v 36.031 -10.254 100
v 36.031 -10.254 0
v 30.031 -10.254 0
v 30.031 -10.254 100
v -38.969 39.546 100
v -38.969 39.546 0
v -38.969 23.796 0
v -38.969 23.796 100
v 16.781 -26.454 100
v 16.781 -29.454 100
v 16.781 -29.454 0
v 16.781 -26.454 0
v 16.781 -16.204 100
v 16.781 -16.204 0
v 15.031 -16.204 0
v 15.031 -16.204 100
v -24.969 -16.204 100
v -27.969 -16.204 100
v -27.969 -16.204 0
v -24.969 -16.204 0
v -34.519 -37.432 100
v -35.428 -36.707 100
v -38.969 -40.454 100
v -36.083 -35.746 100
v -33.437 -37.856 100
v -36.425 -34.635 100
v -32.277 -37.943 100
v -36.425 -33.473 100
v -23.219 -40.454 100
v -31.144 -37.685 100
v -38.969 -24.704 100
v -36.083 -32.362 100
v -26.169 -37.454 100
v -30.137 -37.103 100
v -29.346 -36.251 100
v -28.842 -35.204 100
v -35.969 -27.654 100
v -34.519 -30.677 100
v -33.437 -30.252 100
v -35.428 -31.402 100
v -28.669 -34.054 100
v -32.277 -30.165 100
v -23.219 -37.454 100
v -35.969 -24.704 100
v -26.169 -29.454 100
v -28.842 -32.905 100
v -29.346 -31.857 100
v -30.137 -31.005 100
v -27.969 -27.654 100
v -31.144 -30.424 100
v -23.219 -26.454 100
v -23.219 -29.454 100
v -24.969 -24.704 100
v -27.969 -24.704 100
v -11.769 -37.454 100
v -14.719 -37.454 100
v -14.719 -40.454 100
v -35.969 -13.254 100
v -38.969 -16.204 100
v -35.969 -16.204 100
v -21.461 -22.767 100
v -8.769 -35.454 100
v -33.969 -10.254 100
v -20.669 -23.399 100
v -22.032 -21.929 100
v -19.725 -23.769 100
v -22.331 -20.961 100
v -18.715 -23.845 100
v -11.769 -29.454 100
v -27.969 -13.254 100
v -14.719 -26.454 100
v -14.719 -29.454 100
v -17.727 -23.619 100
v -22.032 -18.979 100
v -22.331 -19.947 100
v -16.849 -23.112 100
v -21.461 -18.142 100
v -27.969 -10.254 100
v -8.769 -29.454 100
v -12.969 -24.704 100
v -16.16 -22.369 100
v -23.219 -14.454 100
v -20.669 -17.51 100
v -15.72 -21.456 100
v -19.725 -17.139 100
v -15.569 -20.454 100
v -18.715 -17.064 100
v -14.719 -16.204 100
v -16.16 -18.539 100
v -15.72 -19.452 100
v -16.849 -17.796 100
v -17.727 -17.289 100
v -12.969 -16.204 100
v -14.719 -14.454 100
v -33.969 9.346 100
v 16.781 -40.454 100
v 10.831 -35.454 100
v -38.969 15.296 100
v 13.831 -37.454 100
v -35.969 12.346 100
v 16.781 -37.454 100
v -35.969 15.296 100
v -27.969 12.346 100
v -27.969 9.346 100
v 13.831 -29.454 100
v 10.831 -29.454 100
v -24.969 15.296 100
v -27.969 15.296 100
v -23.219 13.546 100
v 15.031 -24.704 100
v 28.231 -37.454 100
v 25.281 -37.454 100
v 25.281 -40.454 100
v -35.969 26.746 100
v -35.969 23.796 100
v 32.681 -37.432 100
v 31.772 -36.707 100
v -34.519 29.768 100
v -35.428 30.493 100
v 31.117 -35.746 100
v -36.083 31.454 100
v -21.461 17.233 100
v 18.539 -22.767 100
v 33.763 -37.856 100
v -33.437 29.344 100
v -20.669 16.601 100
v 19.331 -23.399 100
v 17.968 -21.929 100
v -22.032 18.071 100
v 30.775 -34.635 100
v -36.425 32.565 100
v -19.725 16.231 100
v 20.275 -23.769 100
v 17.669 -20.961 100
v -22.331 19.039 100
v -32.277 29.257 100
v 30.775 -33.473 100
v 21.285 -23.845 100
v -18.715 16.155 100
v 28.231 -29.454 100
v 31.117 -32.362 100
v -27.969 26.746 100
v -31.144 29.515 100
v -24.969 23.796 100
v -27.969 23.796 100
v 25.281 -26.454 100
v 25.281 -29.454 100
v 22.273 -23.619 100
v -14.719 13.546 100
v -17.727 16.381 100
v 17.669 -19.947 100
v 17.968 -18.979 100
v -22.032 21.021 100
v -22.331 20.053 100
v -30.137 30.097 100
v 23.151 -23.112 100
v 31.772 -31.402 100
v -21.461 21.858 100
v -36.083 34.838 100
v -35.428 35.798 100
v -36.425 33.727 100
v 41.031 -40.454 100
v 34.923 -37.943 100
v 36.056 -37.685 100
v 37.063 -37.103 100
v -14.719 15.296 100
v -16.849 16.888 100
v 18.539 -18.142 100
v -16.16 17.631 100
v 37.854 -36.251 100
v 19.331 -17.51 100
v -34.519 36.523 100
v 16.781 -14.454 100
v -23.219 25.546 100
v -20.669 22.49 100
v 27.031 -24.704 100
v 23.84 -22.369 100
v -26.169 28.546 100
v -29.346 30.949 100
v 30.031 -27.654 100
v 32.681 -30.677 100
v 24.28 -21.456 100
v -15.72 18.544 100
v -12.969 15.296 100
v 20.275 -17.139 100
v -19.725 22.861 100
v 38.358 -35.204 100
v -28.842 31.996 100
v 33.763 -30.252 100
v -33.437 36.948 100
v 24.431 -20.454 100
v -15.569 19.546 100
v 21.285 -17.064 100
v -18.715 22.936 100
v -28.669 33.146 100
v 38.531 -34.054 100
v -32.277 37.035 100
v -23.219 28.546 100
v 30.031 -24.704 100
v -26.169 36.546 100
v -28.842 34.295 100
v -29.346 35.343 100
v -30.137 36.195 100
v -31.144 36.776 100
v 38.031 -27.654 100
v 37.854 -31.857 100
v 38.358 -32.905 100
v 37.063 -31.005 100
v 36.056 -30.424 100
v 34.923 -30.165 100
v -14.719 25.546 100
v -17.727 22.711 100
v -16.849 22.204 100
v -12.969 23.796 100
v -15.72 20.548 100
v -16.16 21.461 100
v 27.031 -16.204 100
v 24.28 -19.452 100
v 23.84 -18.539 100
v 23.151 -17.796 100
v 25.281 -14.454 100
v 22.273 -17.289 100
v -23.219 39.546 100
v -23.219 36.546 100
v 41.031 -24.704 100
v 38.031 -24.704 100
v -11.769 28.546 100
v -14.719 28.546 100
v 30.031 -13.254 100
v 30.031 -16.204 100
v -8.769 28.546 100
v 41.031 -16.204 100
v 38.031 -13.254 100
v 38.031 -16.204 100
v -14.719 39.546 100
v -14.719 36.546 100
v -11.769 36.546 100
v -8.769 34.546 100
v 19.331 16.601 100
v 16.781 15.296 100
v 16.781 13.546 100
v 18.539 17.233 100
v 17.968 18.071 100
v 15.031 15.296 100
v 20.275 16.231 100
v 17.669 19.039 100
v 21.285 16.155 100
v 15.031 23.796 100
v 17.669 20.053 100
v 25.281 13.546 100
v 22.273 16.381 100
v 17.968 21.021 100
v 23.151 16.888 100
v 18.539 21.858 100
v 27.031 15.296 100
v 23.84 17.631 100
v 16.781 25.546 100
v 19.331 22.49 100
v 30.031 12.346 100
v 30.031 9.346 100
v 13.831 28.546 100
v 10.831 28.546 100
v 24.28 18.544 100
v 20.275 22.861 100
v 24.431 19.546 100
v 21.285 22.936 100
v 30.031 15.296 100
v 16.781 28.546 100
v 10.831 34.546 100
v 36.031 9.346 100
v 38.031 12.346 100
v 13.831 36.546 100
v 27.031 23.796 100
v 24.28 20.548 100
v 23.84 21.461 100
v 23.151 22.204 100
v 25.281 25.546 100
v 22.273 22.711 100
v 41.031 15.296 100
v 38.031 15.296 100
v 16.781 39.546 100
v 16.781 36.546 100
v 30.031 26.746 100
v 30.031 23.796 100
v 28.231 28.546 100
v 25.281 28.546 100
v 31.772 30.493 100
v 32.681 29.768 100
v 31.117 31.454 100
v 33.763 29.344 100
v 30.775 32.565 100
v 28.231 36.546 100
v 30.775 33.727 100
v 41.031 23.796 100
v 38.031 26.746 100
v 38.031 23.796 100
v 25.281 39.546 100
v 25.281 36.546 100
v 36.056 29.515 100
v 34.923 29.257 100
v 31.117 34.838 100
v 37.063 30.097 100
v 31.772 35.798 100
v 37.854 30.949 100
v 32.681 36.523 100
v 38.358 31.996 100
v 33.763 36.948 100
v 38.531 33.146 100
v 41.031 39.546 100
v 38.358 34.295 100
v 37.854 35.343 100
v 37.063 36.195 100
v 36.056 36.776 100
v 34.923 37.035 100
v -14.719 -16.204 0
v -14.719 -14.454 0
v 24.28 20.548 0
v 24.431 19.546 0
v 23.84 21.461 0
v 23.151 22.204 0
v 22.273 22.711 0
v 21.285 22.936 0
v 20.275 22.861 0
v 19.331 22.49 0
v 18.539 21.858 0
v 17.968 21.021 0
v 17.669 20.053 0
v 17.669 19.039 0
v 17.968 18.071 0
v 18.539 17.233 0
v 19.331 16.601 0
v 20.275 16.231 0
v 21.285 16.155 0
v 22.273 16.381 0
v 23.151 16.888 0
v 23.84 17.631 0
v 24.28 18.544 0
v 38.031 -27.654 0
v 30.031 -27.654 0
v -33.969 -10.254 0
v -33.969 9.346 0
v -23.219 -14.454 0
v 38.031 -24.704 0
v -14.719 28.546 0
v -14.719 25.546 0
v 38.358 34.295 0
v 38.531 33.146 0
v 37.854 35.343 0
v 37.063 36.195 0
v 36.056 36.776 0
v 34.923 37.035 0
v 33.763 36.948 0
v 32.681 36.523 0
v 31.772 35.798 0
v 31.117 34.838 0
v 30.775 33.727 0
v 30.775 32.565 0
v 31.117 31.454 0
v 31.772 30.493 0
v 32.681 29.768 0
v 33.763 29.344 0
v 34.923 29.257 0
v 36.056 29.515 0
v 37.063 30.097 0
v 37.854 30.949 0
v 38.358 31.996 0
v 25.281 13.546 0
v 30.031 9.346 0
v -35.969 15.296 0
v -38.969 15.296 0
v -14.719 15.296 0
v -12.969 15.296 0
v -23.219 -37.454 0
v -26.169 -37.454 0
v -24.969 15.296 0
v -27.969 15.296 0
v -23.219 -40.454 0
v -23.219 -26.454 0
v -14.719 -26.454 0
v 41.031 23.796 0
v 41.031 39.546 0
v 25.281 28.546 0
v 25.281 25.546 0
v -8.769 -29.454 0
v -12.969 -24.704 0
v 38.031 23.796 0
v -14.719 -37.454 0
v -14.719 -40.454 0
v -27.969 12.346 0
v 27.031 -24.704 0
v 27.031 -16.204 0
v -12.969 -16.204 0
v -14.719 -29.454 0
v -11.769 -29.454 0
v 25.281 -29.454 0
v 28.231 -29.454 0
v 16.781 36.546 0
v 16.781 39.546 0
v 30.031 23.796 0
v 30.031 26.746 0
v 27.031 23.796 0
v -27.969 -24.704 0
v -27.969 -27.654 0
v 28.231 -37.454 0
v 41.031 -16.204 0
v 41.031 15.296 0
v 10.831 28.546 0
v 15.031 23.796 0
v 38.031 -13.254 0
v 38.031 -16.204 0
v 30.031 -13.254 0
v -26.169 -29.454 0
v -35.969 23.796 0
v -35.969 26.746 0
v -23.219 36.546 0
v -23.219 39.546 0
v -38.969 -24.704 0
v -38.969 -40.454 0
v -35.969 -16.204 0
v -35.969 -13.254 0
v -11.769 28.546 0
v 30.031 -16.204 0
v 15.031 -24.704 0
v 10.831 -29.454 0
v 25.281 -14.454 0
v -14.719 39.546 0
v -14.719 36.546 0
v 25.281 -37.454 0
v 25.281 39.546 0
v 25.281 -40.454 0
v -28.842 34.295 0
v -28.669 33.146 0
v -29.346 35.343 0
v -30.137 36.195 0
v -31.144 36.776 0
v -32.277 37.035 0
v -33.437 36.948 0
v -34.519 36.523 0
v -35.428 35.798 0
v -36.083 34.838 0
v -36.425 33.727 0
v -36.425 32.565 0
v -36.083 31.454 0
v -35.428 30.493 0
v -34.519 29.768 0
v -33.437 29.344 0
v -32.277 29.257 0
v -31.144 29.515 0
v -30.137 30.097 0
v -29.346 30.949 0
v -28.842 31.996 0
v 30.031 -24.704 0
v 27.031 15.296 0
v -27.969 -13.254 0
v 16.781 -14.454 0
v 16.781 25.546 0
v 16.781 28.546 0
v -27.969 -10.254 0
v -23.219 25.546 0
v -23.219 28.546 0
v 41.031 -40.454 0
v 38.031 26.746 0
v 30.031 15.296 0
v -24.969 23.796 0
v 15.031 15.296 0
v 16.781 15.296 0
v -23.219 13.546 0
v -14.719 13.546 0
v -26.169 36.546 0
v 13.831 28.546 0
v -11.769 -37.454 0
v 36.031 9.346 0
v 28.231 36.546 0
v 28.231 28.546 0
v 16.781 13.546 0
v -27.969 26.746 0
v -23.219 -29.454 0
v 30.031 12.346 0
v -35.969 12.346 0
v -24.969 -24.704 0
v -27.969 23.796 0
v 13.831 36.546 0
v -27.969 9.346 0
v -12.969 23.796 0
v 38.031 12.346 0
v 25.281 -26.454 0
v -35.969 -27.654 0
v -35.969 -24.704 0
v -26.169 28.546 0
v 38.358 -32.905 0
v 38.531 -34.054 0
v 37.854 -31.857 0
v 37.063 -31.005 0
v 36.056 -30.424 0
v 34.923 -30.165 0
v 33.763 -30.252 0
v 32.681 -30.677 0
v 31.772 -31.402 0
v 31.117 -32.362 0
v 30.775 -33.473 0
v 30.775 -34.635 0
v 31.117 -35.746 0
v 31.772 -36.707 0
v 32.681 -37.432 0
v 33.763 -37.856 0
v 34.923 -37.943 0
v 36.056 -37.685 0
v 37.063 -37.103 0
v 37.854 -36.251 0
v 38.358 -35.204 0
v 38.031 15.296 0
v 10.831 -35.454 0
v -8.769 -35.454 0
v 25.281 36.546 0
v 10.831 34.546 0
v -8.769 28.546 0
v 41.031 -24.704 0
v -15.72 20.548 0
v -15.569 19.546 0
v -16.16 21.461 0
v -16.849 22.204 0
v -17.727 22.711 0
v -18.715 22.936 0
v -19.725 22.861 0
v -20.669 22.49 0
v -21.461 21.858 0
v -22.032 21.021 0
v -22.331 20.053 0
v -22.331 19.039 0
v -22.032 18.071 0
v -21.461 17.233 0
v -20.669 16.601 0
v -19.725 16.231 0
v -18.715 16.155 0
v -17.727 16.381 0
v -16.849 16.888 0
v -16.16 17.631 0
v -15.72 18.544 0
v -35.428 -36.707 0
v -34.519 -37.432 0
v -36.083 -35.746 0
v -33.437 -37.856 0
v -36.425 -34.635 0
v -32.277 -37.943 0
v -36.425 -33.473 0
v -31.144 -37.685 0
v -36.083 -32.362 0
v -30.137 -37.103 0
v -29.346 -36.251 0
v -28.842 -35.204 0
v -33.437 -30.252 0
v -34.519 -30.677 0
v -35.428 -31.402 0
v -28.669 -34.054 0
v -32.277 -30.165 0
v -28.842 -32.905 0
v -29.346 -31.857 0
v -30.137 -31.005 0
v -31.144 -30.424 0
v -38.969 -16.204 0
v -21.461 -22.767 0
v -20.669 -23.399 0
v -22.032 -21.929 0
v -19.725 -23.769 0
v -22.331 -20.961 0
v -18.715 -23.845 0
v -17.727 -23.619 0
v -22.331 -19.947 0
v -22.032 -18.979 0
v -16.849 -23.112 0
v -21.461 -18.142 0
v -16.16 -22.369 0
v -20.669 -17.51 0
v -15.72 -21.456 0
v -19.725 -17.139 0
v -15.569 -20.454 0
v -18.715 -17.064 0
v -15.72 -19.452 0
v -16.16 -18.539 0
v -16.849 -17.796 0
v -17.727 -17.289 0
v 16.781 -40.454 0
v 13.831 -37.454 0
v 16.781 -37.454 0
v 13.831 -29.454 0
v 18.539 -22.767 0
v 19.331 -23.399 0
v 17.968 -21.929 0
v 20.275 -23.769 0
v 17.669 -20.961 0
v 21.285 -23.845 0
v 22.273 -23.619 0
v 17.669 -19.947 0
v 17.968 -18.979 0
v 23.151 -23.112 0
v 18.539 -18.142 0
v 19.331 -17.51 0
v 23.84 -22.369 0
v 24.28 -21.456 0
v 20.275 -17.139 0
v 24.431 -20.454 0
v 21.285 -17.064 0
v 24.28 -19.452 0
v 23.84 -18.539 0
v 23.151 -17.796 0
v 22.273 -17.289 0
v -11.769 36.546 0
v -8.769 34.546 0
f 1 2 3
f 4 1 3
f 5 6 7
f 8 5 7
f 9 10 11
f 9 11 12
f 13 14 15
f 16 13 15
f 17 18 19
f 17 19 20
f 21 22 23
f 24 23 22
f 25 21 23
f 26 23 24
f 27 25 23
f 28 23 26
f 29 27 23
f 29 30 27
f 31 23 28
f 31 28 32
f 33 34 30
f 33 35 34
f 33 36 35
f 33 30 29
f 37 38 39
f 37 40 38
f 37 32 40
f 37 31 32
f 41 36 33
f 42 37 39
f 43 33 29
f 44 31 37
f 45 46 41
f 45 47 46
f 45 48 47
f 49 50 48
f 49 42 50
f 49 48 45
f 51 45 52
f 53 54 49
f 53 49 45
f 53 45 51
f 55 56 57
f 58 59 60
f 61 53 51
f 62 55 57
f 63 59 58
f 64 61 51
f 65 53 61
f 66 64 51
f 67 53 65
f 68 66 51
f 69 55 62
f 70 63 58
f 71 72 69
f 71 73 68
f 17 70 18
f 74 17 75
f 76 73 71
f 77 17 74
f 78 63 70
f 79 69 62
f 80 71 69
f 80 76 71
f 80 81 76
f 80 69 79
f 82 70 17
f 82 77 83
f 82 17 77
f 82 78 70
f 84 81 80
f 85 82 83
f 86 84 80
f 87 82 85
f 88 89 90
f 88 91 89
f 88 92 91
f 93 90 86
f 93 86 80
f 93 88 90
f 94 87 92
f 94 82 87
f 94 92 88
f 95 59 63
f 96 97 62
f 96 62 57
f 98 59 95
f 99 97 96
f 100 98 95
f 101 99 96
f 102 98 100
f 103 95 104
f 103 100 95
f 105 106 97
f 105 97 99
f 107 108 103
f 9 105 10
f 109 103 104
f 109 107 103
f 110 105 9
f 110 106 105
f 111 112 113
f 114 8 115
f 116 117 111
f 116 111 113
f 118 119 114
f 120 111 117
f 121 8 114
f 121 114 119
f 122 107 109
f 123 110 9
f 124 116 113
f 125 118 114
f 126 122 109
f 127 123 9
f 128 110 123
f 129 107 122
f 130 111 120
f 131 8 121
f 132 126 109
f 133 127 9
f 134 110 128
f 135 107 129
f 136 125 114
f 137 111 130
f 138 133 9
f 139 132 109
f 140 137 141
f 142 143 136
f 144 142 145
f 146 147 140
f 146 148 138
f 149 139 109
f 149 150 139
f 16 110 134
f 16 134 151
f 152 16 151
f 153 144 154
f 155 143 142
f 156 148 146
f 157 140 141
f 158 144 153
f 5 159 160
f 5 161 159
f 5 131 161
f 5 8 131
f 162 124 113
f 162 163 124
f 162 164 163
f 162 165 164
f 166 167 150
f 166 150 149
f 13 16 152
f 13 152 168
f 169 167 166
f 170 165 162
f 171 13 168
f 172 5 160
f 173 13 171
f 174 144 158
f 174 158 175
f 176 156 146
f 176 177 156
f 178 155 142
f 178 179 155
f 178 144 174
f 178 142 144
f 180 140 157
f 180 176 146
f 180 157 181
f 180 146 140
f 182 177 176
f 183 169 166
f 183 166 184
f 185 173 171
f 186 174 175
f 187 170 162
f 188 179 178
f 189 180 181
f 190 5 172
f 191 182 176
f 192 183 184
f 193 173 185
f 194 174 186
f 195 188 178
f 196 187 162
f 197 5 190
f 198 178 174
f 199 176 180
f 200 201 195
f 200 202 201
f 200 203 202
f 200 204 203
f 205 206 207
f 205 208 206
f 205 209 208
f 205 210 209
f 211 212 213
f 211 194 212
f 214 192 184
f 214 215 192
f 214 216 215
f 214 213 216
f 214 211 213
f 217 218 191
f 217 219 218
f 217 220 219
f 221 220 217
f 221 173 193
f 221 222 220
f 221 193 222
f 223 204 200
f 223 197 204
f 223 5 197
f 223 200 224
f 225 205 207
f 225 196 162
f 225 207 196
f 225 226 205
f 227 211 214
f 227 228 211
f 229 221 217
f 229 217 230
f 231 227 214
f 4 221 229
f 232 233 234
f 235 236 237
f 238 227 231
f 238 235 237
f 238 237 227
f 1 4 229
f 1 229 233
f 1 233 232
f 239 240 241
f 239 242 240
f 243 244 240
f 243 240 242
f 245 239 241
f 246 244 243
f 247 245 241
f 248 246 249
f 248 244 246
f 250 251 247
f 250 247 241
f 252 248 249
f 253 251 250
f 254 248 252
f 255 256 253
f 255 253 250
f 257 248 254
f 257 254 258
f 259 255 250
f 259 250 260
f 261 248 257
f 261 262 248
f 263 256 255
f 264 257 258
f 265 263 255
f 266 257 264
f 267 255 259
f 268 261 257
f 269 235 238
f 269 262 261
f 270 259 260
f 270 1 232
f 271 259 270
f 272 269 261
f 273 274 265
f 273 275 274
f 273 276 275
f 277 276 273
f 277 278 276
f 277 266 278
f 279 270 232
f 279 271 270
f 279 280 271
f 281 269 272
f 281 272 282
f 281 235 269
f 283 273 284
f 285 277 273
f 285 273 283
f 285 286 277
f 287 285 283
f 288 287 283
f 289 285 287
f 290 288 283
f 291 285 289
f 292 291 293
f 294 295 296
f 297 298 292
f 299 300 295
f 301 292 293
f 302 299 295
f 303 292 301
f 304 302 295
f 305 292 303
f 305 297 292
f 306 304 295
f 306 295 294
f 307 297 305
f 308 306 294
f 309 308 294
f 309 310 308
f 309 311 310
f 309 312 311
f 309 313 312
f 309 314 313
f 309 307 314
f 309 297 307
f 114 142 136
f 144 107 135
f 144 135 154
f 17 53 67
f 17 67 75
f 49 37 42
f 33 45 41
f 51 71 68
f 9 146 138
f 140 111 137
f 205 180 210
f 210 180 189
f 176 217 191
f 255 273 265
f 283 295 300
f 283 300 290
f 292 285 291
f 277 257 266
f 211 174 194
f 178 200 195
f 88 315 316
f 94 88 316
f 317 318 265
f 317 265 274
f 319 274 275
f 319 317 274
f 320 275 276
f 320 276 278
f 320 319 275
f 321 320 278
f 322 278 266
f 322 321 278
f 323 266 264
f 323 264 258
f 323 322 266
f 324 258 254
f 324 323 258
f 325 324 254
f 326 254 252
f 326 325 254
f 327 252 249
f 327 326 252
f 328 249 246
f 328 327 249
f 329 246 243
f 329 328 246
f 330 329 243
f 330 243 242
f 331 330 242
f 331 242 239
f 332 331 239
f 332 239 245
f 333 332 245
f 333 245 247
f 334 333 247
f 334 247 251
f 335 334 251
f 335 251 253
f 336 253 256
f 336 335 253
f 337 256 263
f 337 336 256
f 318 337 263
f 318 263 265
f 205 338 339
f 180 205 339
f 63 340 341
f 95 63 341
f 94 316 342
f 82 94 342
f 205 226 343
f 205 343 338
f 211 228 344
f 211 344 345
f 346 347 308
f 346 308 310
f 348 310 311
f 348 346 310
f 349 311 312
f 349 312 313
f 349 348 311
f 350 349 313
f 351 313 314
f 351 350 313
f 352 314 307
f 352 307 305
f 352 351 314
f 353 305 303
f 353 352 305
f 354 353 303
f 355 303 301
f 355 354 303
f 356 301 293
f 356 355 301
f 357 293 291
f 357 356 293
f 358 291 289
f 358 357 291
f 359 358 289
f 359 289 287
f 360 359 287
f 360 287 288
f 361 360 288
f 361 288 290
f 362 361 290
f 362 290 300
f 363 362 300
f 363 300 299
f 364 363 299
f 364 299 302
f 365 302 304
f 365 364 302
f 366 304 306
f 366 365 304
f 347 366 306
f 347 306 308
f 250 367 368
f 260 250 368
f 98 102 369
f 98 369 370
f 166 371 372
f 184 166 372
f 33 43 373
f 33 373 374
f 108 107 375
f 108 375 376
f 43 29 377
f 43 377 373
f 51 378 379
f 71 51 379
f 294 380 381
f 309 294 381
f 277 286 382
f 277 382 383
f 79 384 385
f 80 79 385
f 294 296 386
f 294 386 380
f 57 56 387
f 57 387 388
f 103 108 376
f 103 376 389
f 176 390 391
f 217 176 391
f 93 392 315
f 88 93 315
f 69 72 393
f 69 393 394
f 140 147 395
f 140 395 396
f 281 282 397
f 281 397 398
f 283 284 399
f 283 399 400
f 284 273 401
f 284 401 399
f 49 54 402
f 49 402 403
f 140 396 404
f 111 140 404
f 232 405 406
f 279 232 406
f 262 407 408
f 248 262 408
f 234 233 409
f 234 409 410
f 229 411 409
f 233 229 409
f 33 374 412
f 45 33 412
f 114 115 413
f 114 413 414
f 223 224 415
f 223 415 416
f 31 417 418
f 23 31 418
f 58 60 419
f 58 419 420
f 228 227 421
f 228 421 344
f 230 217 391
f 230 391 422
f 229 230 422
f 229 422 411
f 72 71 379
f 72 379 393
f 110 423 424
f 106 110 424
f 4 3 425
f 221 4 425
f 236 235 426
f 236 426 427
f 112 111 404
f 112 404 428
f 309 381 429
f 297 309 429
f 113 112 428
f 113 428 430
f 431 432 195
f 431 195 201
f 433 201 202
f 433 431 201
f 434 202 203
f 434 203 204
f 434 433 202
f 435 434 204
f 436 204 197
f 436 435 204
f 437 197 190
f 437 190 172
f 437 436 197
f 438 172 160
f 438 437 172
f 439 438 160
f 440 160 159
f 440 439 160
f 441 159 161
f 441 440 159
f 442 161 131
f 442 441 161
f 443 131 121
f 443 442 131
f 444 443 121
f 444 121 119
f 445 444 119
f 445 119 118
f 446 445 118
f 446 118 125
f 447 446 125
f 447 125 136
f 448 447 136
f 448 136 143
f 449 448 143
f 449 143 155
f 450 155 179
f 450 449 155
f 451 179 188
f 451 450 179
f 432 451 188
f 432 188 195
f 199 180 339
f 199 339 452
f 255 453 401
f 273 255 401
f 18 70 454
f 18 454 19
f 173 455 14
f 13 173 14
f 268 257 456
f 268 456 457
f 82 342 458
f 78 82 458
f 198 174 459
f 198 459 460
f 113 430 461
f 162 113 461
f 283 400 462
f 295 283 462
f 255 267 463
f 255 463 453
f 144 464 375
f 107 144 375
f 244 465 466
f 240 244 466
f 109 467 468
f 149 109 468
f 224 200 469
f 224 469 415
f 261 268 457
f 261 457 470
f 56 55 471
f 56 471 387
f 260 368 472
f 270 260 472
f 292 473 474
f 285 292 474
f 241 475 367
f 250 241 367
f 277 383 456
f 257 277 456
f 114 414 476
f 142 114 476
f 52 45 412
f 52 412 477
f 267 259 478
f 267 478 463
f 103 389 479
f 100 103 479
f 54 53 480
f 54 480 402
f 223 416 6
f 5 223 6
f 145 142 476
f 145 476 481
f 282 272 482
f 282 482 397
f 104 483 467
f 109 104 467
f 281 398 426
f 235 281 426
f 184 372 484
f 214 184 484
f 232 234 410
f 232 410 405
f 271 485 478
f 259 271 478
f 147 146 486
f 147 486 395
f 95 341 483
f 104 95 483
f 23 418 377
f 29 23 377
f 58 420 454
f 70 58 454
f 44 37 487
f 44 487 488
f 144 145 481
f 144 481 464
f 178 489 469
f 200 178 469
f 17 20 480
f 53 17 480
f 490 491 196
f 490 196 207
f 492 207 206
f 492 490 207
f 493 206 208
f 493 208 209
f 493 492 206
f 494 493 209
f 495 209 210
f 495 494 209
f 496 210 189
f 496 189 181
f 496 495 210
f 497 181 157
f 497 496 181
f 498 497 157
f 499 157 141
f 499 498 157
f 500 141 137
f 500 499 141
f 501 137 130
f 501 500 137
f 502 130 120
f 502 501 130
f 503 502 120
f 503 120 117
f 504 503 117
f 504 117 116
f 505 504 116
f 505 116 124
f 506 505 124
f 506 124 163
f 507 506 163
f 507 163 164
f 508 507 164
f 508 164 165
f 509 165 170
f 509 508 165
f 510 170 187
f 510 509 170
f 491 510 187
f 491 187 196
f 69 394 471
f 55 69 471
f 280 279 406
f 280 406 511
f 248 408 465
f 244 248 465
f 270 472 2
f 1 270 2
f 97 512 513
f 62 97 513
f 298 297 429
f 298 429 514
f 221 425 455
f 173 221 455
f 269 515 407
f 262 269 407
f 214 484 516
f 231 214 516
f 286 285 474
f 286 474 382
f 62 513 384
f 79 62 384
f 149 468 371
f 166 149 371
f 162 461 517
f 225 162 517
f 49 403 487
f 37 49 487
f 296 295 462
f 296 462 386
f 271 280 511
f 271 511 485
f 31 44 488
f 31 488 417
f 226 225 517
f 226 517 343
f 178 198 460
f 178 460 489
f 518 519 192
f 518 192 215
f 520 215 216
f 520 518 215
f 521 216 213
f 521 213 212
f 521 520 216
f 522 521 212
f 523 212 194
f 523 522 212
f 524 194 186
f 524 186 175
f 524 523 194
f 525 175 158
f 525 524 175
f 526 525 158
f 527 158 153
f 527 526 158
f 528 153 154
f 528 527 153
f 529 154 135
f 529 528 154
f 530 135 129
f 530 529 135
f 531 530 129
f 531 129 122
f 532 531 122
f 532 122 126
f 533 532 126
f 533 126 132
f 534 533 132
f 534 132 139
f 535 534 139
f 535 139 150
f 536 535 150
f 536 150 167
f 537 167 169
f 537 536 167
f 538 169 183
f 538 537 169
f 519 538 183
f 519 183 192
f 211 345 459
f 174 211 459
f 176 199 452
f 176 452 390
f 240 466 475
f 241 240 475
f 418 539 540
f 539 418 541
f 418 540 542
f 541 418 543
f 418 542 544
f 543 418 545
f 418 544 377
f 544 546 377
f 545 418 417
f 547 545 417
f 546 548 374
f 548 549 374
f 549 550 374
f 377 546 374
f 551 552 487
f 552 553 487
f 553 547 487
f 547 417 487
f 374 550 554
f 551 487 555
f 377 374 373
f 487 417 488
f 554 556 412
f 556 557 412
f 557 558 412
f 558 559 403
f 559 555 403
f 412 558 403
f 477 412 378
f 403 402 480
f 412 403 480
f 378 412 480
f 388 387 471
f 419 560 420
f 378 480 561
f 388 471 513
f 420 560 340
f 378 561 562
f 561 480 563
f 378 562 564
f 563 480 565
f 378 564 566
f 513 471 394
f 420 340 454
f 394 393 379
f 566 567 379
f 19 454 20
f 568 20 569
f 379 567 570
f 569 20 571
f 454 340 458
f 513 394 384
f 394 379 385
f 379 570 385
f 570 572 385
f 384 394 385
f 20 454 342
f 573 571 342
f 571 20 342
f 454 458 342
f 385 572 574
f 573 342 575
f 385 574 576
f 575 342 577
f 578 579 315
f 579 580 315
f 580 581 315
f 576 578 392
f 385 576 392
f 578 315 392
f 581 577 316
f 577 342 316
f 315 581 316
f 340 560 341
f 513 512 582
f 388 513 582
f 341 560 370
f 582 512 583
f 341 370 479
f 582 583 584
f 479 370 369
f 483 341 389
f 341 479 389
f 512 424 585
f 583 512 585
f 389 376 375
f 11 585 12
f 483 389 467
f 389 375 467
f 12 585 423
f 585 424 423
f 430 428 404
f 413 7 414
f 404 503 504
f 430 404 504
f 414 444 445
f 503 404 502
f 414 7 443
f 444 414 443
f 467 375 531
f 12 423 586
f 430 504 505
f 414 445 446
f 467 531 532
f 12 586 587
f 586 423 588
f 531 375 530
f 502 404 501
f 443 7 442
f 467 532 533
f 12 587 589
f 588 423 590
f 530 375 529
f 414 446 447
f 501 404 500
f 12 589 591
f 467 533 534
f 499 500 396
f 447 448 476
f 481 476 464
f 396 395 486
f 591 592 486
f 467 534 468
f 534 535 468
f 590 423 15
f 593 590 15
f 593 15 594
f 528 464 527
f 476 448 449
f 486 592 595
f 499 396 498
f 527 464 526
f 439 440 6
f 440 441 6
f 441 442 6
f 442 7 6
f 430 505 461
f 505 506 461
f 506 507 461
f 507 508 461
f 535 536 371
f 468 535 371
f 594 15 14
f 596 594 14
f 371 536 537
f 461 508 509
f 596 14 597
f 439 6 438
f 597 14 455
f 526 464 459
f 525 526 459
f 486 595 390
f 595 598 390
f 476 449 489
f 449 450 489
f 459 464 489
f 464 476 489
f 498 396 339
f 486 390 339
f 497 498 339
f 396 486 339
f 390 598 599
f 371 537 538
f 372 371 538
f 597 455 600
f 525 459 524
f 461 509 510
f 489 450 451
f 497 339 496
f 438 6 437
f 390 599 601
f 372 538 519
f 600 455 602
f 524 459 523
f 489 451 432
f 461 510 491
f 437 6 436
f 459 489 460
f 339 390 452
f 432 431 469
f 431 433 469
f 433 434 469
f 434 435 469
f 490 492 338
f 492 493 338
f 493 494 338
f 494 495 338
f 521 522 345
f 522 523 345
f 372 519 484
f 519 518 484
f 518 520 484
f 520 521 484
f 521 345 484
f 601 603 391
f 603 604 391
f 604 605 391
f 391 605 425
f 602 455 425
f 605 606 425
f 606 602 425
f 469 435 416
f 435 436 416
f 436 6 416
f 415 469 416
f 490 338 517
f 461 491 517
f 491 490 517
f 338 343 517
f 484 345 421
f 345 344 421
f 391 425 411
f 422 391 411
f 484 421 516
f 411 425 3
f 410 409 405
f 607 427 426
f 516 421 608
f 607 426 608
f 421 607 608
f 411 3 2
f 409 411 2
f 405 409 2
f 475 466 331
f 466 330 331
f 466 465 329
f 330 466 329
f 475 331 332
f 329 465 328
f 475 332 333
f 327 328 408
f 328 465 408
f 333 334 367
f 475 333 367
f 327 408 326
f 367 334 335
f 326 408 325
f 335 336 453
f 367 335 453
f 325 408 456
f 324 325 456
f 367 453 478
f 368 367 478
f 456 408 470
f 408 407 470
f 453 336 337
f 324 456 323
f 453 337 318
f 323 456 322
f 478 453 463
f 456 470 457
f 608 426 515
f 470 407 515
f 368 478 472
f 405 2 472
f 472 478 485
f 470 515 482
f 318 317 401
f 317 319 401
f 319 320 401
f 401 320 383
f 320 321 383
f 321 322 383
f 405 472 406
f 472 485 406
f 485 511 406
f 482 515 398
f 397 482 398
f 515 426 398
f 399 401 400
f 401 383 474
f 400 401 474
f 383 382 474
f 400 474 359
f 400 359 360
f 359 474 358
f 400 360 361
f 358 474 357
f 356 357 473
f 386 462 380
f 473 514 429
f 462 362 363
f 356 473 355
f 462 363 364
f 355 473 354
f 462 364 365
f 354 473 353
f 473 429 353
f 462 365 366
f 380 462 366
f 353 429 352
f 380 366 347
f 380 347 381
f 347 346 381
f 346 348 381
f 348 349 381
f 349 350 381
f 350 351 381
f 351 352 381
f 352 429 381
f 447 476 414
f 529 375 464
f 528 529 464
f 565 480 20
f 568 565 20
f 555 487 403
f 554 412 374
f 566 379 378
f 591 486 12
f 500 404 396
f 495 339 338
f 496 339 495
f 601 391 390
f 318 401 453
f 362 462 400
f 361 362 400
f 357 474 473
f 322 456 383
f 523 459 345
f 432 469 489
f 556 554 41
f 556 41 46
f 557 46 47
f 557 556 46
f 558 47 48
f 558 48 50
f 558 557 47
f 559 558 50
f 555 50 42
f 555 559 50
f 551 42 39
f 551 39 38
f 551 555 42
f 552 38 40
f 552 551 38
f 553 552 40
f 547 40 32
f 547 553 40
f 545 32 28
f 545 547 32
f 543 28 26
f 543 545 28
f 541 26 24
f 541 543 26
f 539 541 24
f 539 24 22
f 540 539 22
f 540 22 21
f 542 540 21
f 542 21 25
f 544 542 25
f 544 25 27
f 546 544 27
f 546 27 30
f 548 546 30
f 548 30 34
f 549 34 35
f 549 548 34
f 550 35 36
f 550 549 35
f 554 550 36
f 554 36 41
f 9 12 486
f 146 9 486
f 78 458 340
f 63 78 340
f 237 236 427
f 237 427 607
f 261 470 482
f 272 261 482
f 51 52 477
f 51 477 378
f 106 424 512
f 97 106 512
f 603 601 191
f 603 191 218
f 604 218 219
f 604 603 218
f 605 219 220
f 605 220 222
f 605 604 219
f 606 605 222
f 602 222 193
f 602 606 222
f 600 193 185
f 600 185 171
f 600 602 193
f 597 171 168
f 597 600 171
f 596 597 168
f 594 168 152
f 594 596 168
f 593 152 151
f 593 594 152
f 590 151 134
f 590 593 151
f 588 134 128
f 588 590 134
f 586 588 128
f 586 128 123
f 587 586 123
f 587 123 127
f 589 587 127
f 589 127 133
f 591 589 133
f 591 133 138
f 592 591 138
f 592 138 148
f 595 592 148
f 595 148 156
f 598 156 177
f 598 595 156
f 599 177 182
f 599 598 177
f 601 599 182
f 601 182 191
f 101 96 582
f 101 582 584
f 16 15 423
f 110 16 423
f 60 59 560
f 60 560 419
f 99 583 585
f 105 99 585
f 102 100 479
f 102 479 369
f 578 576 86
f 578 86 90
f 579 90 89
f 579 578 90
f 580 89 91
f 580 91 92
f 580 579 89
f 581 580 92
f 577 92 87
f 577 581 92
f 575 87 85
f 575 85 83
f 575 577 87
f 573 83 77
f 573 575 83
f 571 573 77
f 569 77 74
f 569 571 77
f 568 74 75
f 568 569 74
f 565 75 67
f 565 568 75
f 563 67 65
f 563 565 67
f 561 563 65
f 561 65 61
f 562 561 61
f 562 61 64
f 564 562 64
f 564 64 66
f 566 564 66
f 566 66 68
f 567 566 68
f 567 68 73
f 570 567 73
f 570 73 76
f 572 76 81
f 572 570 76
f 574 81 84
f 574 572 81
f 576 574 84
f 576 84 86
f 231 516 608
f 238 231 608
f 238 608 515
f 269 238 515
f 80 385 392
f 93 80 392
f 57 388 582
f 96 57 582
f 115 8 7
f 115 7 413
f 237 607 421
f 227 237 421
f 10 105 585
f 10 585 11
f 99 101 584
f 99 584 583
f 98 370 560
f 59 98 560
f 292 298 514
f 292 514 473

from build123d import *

# Parameters (mm, degrees)
SKETCH_1_R      = 3.9
SKETCH_1_R_2    = 3.4
EXTRUDE_1_DEPTH = 100


with BuildPart() as part:
    # 草图1 → 凸台-拉伸1 (new body)
    with BuildSketch(Plane.XY):
        Polygon((-23.218782805, 39.545792426), (-38.968782805, 39.545792426), (-38.968782805, 23.795792426), (-35.968782805, 23.795792426), (-35.968782805, 26.745792426), (-27.968782805, 26.745792426), (-27.968782805, 23.795792426), (-24.968782805, 23.795792426), (-24.968782805, 15.295792426), (-27.968782805, 15.295792426), (-27.968782805, 12.345792426), (-35.968782805, 12.345792426), (-35.968782805, 15.295792426), (-38.968782805, 15.295792426), (-38.968782805, -0.454207574), (-38.968782805, -16.204207574), (-35.968782805, -16.204207574), (-35.968782805, -13.254207574), (-27.968782805, -13.254207574), (-27.968782805, -16.204207574), (-24.968782805, -16.204207574), (-24.968782805, -24.704207574), (-27.968782805, -24.704207574), (-27.968782805, -27.654207574), (-35.968782805, -27.654207574), (-35.968782805, -24.704207574), (-38.968782805, -24.704207574), (-38.968782805, -40.454207574), (-23.218782805, -40.454207574), (-23.218782805, -37.454207574), (-26.168782805, -37.454207574), (-26.168782805, -29.454207574), (-23.218782805, -29.454207574), (-23.218782805, -26.454207574), (-14.718782805, -26.454207574), (-14.718782805, -29.454207574), (-11.768782805, -29.454207574), (-11.768782805, -37.454207574), (-14.718782805, -37.454207574), (-14.718782805, -40.454207574), (1.031217195, -40.454207574), (16.781217195, -40.454207574), (16.781217195, -37.454207574), (13.831217195, -37.454207574), (13.831217195, -29.454207574), (16.781217195, -29.454207574), (16.781217195, -26.454207574), (25.281217195, -26.454207574), (25.281217195, -29.454207574), (28.231217195, -29.454207574), (28.231217195, -37.454207574), (25.281217195, -37.454207574), (25.281217195, -40.454207574), (41.031217195, -40.454207574), (41.031217195, -24.704207574), (38.031217195, -24.704207574), (38.031217195, -27.654207574), (30.031217195, -27.654207574), (30.031217195, -24.704207574), (27.031217195, -24.704207574), (27.031217195, -16.204207574), (30.031217195, -16.204207574), (30.031217195, -13.254207574), (38.031217195, -13.254207574), (38.031217195, -16.204207574), (41.031217195, -16.204207574), (41.031217195, -0.454207574), (41.031217195, 15.295792426), (38.031217195, 15.295792426), (38.031217195, 12.345792426), (30.031217195, 12.345792426), (30.031217195, 15.295792426), (27.031217195, 15.295792426), (27.031217195, 23.795792426), (30.031217195, 23.795792426), (30.031217195, 26.745792426), (38.031217195, 26.745792426), (38.031217195, 23.795792426), (41.031217195, 23.795792426), (41.031217195, 39.545792426), (25.281217195, 39.545792426), (25.281217195, 36.545792426), (28.231217195, 36.545792426), (28.231217195, 28.545792426), (25.281217195, 28.545792426), (25.281217195, 25.545792426), (16.781217195, 25.545792426), (16.781217195, 28.545792426), (13.831217195, 28.545792426), (13.831217195, 36.545792426), (16.781217195, 36.545792426), (16.781217195, 39.545792426), (1.031217195, 39.545792426), (-14.718782805, 39.545792426), (-14.718782805, 36.545792426), (-11.768782805, 36.545792426), (-11.768782805, 28.545792426), (-14.718782805, 28.545792426), (-14.718782805, 25.545792426), (-23.218782805, 25.545792426), (-23.218782805, 28.545792426), (-26.168782805, 28.545792426), (-26.168782805, 36.545792426), (-23.218782805, 36.545792426), align=None)
        with Locations((-32.568782805, 33.145792426)):
            Circle(SKETCH_1_R, mode=Mode.SUBTRACT)
        with Locations((-18.968782805, 19.545792426)):
            Circle(SKETCH_1_R_2, mode=Mode.SUBTRACT)
        with Locations((34.631217195, 33.145792426)):
            Circle(SKETCH_1_R, mode=Mode.SUBTRACT)
        with Locations((21.031217195, 19.545792426)):
            Circle(SKETCH_1_R_2, mode=Mode.SUBTRACT)
        with Locations((-32.568782805, -34.054207574)):
            Circle(SKETCH_1_R, mode=Mode.SUBTRACT)
        with Locations((-18.968782805, -20.454207574)):
            Circle(SKETCH_1_R_2, mode=Mode.SUBTRACT)
        with Locations((34.631217195, -34.054207574)):
            Circle(SKETCH_1_R, mode=Mode.SUBTRACT)
        with Locations((21.031217195, -20.454207574)):
            Circle(SKETCH_1_R_2, mode=Mode.SUBTRACT)
        Polygon((-23.218782805, 13.545792426), (-14.718782805, 13.545792426), (-14.718782805, 15.295792426), (-12.968782805, 15.295792426), (-12.968782805, 23.795792426), (-8.768782805, 28.545792426), (-8.768782805, 34.545792426), (10.831217195, 34.545792426), (10.831217195, 28.545792426), (15.031217195, 23.795792426), (15.031217195, 15.295792426), (16.781217195, 15.295792426), (16.781217195, 13.545792426), (25.281217195, 13.545792426), (30.031217195, 9.345792426), (36.031217195, 9.345792426), (36.031217195, -10.254207574), (30.031217195, -10.254207574), (25.281217195, -14.454207574), (16.781217195, -14.454207574), (16.781217195, -16.204207574), (15.031217195, -16.204207574), (15.031217195, -24.704207574), (10.831217195, -29.454207574), (10.831217195, -35.454207574), (-8.768782805, -35.454207574), (-8.768782805, -29.454207574), (-12.968782805, -24.704207574), (-12.968782805, -16.204207574), (-14.718782805, -16.204207574), (-14.718782805, -14.454207574), (-23.218782805, -14.454207574), (-27.968782805, -10.254207574), (-33.968782805, -10.254207574), (-33.968782805, 9.345792426), (-27.968782805, 9.345792426), align=None, mode=Mode.SUBTRACT)
    extrude(amount=EXTRUDE_1_DEPTH)


solid = part.part
